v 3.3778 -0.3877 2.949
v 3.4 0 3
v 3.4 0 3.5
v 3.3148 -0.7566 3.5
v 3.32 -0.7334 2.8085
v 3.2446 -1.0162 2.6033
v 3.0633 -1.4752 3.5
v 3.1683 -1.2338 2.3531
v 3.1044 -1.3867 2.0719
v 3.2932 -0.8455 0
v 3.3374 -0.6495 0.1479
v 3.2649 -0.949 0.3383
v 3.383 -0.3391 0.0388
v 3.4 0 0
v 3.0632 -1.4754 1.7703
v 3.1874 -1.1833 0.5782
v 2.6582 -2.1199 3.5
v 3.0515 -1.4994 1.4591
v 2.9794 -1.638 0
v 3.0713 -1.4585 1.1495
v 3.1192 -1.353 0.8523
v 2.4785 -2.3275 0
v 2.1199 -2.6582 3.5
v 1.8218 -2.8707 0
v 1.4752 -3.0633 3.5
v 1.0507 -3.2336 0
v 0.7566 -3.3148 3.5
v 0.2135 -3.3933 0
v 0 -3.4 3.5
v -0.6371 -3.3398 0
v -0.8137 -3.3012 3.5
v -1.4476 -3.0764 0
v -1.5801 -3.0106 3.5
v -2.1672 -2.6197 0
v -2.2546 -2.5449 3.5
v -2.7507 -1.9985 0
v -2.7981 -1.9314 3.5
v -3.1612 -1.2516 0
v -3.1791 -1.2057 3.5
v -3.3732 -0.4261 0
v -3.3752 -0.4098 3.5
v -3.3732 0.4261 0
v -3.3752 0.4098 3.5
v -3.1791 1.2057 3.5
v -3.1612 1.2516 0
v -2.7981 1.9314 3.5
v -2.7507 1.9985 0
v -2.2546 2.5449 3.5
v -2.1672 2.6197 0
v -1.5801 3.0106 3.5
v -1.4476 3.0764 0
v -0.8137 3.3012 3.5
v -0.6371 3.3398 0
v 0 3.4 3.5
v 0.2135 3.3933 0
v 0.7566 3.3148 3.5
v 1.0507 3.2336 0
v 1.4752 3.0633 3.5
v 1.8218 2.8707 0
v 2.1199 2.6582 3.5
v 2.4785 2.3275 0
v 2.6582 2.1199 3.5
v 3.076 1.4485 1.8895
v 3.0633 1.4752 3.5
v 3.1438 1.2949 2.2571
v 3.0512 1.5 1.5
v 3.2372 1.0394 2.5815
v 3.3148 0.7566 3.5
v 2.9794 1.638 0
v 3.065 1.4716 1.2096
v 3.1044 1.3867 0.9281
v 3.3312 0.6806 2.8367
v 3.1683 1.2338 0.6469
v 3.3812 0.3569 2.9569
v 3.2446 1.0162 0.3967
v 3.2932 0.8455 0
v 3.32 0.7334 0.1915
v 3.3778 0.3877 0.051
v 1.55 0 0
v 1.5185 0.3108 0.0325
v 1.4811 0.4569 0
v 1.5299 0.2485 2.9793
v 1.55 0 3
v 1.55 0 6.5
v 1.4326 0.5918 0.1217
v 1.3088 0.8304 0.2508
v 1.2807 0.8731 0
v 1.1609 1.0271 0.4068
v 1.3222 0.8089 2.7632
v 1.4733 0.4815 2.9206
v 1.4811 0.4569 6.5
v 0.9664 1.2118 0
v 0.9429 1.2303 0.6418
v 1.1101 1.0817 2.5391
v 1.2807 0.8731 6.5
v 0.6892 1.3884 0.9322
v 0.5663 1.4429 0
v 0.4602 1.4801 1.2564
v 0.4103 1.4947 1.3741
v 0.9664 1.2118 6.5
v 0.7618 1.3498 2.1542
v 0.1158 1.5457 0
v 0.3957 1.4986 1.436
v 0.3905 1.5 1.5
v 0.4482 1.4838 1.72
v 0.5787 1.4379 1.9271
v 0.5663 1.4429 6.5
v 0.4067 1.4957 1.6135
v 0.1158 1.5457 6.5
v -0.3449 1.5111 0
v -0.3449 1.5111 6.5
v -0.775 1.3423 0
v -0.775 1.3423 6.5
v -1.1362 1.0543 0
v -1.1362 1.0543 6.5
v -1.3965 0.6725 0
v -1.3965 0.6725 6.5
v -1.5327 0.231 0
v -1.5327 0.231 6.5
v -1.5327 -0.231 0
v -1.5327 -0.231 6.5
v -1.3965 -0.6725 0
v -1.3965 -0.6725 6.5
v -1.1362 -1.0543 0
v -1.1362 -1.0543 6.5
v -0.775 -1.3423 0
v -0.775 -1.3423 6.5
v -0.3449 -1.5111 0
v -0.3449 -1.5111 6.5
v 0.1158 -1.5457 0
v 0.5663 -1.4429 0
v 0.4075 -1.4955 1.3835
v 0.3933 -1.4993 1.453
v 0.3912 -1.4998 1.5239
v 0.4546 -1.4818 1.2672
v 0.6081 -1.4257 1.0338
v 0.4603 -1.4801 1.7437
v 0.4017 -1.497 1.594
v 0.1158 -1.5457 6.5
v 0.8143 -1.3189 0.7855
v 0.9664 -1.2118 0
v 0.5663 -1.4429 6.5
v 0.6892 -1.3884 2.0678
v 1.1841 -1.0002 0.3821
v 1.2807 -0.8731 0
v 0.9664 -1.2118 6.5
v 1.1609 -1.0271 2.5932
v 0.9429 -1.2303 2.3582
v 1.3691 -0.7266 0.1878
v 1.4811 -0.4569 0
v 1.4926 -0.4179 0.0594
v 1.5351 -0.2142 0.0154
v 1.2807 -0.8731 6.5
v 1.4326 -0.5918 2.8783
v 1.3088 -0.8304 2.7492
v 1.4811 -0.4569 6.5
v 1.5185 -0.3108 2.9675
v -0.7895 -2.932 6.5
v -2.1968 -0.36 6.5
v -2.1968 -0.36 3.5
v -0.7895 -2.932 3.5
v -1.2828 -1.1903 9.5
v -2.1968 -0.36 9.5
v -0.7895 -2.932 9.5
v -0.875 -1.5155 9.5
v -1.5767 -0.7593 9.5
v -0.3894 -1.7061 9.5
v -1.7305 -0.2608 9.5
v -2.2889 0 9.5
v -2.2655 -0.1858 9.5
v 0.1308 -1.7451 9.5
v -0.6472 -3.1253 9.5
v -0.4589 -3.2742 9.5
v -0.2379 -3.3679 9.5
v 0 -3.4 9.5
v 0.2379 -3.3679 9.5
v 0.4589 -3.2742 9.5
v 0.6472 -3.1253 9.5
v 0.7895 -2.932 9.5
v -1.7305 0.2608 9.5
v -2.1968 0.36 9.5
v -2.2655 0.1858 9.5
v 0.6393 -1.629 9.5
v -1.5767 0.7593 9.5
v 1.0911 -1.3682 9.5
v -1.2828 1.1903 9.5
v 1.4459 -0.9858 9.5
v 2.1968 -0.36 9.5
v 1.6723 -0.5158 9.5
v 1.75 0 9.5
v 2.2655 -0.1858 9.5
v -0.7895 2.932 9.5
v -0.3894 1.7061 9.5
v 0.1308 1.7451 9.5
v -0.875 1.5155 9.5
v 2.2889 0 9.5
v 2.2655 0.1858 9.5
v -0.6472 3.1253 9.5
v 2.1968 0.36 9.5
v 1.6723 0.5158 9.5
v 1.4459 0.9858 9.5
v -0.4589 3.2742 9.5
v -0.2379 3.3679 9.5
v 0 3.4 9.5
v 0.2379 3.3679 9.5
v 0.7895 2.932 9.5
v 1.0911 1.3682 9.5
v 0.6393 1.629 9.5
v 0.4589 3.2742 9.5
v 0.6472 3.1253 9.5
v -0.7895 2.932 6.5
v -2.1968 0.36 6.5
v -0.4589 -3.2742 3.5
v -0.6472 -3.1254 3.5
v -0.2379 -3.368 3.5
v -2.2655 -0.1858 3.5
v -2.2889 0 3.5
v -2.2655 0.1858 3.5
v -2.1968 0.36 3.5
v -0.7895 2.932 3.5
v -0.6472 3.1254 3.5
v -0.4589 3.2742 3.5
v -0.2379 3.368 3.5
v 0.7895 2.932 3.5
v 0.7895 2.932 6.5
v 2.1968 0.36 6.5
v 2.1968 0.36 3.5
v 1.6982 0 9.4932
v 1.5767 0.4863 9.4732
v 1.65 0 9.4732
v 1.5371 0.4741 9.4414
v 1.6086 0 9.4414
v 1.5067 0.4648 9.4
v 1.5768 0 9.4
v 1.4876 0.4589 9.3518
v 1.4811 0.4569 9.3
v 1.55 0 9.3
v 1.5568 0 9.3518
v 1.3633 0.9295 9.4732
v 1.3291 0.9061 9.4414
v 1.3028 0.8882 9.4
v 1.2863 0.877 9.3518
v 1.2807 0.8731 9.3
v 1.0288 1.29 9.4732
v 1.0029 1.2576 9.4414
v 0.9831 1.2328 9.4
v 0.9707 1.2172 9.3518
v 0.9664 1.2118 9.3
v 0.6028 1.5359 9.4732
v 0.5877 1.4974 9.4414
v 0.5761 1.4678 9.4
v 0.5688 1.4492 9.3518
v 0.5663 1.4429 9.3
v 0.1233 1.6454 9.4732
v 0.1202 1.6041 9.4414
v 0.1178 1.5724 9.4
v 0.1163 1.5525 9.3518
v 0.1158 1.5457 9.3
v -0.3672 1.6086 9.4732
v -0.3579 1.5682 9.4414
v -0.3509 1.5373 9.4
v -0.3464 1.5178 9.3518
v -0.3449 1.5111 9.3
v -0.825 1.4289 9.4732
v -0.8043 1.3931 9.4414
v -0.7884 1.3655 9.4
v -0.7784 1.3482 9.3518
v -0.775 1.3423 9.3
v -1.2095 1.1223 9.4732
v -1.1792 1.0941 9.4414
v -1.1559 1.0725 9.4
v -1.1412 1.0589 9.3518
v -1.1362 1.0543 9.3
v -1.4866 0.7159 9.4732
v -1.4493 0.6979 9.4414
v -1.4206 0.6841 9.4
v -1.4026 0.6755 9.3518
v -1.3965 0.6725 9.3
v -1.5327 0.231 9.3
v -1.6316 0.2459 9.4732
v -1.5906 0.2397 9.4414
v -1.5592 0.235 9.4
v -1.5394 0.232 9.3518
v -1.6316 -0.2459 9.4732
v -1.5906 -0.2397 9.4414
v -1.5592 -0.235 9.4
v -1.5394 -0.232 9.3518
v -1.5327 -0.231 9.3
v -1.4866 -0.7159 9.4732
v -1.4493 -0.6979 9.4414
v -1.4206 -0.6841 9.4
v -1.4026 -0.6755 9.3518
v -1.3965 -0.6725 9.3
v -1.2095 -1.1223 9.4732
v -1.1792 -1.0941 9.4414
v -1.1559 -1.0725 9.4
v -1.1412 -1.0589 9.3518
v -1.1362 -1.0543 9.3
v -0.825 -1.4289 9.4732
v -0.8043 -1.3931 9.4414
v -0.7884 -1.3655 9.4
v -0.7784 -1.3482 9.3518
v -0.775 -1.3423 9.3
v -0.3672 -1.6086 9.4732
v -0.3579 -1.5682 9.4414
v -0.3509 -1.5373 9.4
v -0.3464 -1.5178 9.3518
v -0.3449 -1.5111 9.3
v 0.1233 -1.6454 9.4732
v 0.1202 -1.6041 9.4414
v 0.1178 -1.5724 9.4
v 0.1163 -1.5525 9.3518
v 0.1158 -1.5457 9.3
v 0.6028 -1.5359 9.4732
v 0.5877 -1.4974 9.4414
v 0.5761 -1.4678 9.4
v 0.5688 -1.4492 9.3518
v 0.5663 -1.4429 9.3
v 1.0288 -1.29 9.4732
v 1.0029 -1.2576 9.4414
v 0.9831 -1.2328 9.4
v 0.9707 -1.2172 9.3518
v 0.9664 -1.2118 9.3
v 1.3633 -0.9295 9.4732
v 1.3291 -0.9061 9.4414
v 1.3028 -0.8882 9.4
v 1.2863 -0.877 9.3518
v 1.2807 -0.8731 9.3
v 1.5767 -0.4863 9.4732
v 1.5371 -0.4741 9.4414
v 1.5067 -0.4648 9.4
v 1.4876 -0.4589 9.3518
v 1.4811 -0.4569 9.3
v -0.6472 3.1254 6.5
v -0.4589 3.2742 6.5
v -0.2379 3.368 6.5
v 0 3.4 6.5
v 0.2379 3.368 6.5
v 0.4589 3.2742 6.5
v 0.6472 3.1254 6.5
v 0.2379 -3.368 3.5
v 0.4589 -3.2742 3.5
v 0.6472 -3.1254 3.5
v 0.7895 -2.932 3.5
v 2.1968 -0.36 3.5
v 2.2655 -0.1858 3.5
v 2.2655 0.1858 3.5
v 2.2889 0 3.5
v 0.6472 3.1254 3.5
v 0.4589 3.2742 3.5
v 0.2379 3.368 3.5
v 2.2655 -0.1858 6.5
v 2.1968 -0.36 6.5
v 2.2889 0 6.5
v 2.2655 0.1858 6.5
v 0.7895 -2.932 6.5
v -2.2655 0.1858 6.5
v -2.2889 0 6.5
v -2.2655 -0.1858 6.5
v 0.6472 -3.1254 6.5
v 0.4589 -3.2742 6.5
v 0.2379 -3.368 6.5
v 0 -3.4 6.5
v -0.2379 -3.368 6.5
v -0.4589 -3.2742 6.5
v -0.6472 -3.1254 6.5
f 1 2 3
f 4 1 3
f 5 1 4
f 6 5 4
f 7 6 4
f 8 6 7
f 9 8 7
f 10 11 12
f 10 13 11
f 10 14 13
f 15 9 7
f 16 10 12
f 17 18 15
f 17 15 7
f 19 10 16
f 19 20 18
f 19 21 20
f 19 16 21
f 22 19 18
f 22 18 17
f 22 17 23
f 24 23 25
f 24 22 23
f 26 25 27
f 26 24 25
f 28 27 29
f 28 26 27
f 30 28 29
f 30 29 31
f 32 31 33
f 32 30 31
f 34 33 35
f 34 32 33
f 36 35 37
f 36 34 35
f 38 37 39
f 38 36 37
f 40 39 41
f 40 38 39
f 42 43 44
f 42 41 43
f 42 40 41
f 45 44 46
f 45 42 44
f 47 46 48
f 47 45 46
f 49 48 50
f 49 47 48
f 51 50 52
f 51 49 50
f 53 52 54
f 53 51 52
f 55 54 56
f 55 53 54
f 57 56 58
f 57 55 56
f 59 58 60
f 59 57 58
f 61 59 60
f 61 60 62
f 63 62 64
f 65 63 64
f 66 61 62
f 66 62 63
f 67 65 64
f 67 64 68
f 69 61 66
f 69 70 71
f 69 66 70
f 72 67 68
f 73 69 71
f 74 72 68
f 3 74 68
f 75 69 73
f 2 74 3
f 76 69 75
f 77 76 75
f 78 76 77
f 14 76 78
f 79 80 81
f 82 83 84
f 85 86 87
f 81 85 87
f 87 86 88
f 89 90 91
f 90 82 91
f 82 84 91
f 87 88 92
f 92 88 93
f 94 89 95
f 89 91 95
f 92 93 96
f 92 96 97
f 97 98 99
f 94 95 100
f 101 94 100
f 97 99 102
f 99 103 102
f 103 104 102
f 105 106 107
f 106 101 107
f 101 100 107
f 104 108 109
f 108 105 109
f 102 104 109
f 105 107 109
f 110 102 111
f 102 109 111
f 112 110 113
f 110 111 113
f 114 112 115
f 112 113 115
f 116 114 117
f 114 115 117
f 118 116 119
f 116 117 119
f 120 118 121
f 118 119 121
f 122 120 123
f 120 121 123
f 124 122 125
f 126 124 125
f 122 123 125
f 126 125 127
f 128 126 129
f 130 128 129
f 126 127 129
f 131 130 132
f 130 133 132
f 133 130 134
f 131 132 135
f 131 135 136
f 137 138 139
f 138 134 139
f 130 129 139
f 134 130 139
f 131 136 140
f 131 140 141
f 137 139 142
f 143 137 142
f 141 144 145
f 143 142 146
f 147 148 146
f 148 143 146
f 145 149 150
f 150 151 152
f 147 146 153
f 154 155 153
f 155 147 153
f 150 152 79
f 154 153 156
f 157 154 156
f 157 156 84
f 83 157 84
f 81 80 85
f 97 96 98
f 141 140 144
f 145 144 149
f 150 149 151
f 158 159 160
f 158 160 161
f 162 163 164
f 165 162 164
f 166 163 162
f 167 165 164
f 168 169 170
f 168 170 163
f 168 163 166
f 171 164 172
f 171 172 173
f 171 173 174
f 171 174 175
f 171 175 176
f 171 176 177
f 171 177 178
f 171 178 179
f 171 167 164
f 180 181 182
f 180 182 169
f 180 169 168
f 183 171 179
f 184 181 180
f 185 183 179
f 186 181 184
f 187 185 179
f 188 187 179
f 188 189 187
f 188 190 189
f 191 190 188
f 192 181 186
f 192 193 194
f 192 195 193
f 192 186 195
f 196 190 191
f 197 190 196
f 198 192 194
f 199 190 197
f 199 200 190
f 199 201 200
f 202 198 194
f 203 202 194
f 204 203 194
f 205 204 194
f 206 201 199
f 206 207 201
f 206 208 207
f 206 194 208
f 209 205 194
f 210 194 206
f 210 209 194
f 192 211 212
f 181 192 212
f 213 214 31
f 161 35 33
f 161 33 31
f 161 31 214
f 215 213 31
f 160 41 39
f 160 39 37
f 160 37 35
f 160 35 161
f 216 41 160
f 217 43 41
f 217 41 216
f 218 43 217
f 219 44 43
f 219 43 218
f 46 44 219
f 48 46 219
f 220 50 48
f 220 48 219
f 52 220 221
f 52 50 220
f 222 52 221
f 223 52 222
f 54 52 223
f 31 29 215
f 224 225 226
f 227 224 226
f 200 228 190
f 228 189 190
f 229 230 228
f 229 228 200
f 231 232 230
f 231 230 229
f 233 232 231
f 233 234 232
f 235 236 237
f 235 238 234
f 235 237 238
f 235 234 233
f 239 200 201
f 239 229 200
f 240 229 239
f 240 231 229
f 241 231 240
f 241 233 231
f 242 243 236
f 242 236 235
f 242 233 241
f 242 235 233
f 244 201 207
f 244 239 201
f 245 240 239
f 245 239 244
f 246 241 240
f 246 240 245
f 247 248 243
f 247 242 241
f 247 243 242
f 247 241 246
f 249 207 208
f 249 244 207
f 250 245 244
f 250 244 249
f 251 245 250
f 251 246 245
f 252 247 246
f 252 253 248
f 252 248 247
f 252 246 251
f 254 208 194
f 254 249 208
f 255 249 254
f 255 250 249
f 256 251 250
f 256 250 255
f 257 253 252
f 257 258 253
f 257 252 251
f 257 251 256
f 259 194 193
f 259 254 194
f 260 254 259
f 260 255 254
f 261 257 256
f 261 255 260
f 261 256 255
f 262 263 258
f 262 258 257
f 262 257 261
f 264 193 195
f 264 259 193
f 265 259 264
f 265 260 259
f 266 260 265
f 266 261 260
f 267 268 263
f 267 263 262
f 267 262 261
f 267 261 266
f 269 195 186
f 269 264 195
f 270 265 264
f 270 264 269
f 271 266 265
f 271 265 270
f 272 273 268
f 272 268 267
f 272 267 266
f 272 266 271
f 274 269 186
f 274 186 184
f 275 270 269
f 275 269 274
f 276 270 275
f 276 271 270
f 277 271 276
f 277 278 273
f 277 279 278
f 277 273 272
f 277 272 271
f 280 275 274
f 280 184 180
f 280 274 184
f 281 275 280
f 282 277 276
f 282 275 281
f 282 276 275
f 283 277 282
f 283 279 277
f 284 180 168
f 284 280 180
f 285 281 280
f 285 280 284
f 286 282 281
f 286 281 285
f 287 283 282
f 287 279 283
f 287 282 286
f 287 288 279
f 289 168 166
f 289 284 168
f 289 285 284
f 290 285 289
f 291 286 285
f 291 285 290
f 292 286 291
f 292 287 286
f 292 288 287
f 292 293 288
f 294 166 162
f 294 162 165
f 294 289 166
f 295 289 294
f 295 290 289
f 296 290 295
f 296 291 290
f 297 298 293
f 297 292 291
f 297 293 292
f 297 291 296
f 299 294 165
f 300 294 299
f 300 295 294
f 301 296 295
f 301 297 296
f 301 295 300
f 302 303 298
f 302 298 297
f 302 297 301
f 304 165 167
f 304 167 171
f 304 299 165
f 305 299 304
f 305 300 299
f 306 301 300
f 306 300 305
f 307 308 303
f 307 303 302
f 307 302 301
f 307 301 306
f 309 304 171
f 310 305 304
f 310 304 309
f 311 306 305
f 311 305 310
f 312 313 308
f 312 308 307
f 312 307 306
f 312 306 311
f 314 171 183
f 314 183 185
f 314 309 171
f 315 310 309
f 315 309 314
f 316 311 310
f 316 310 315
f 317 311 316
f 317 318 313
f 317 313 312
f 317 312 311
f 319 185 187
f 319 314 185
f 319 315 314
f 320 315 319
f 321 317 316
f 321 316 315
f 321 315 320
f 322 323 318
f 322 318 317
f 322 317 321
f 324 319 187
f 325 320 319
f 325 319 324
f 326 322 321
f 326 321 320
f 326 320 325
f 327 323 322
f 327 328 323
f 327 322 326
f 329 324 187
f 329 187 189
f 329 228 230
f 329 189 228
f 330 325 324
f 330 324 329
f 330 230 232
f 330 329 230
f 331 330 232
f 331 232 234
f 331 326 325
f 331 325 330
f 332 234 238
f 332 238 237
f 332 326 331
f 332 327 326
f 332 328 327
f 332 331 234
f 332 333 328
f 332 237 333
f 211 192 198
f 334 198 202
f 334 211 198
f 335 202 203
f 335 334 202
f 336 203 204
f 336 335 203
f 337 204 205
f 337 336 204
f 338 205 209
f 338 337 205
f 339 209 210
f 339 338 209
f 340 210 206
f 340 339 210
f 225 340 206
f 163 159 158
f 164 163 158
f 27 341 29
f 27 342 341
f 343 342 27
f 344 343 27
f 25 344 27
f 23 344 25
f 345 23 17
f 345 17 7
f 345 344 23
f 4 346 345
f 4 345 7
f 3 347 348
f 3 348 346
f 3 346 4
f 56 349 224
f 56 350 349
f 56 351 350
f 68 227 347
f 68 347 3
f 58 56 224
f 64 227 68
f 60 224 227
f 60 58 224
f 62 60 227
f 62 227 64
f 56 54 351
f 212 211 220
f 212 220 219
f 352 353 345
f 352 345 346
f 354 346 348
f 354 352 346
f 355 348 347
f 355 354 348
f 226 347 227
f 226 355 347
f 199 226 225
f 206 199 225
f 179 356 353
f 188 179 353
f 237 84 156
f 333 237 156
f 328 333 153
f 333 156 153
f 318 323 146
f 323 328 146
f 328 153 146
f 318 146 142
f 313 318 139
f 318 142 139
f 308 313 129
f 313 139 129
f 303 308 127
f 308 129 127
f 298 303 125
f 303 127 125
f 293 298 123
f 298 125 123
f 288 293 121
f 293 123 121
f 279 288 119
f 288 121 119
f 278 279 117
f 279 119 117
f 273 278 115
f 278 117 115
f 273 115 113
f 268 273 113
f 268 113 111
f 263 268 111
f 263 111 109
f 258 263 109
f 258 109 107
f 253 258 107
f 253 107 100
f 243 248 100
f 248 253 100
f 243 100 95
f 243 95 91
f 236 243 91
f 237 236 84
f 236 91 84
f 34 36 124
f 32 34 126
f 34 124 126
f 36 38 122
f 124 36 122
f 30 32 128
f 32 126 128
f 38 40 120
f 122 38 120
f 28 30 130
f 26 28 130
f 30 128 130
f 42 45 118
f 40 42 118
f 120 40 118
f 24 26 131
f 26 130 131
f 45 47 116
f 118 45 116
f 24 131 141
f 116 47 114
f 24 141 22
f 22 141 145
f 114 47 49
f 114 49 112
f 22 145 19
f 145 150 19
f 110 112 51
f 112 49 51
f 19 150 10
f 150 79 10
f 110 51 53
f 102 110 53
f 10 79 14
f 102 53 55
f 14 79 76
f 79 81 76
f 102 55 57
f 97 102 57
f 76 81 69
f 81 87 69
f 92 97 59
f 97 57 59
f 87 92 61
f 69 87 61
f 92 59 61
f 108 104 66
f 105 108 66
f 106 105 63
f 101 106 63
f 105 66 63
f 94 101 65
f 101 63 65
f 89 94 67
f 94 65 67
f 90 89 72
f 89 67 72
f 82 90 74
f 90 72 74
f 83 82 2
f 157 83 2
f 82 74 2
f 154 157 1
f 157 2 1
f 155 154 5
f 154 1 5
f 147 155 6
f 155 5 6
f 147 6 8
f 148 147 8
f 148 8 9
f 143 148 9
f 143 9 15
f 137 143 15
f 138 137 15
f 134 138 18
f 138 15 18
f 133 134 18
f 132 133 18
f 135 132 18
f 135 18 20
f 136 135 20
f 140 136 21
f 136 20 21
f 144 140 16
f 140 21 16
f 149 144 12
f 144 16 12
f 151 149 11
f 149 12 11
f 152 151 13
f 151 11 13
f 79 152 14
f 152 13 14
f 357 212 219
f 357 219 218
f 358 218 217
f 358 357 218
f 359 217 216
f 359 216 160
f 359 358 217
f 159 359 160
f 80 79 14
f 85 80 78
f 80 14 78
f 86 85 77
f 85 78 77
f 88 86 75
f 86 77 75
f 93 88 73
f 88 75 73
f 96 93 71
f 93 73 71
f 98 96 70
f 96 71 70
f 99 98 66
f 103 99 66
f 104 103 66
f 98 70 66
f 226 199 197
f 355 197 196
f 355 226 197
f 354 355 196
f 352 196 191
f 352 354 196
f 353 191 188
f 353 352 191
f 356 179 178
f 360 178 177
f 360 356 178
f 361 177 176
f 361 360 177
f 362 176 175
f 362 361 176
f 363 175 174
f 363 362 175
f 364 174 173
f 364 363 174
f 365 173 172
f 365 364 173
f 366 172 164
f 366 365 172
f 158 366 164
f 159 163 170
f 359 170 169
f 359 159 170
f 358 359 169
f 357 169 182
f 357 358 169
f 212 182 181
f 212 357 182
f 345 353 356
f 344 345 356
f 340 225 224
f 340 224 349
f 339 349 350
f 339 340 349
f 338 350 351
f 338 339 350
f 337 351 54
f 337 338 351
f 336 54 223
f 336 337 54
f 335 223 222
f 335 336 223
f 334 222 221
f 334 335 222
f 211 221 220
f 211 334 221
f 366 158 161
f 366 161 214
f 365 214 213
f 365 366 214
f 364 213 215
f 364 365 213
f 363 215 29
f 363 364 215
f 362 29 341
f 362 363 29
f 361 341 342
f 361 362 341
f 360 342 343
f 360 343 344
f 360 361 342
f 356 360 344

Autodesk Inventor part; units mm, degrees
ref_plane "XZ Plane" through (0, 0, 0) normal (0, 1, 0) x (-1, 0, 0)
ref_plane "XY Plane" through (0, 0, 0) normal (0, 0, 1) x (1, 0, 0)
sketch "草圖1" plane through (0, 0, 0) normal (0, 0, 1) x (1, 0, 0)
  circle A0 centre (0, 0) radius 3.4
  dimension "d0" = 6.8
extrude "擠出1" add sketch "草圖1" along normal blind 6.5
sketch "草圖2" plane through (0, 0, 6.5) normal (0, 0, 1) x (1, 0, 0)
  circle A0 centre (0, 0) radius 1.55
  dimension "d3" = 3.1
extrude "擠出2" cut sketch "草圖2" against normal up to surface (6.5 mm away)
ref_plane "工作平面1" through (3.4, 0, 0) normal (1, 0, 0) x (0, 1, 0)
sketch "草圖3" plane through (3.4, 0, 0) normal (1, 0, 0) x (0, 1, 0)
  circle A0 centre (0, 1.5) radius 1.5
  line L0 (0, -1.3) -> (0, 7.8) projected
  line L1 (3.4, 0) -> (-3.4, 0) projected
  point P0 (0, 0)
  dimension "d6" = 3
extrude "擠出3" cut sketch "草圖3" against normal up to surface
sketch "草圖4" plane through (0, 0, 6.5) normal (0, 0, 1) x (1, 0, 0)
  circle A0 centre (0, 2.5) radius 0.9
  circle A1 centre (0, -2.5) radius 0.9
  line L0 (-0.7895, 2.932) -> (-2.3938, 0)
  line L1 (-2.3938, 0) -> (-0.7895, -2.932)
  line L2 (0.7895, 2.932) -> (2.3938, 0)
  line L3 (2.3938, 0) -> (0.7895, -2.932)
  circle A2 centre (-1.5389, 0) radius 0.75
  line L4 (3.4, 0) -> (1.55, 0) projected
  circle A3 centre (1.5389, 0) radius 0.75
  line L5 (0, -4.76) -> (0, 4.76) projected
  circle A4 centre (0, 0) radius 3.4 projected
  circle A5 centre (0, 0) radius 2.1
  point P0 (0, 3.4)
  point P1 (2.1968, 0.36)
  point P2 (2.1968, -0.36)
  point P3 (0, -3.4)
  point P4 (-2.1968, -0.36)
  point P5 (-2.1968, 0.36)
  dimension "d10" = 1.8
  dimension "d13" = 1.5
  dimension "d16" = 4.2
extrude "擠出4" cut sketch "草圖4" against normal blind 3 contours A0 A4 L4 L2 | A0 L0 L1 A1 A4 | A4 A1 L3 L4 | L2 L4 A3 | L3 A3 L4 | A2 L1 L0
sketch "草圖5" plane through (0, 0, 6.5) normal (0, 0, 1) x (1, 0, 0)
  arc A0 (-0.7895, -2.932) -> (0.7895, -2.932) centre (0, -2.5) ccw projected
  line L0 (0.7895, -2.932) -> (2.1968, -0.36) projected
  arc A1 (2.1968, -0.36) -> (2.1968, 0.36) centre (1.5389, 0) ccw projected
  line L1 (2.1968, 0.36) -> (0.7895, 2.932) projected
  arc A2 (0.7895, 2.932) -> (-0.7895, 2.932) centre (0, 2.5) ccw projected
  line L2 (-0.7895, 2.932) -> (-2.1968, 0.36) projected
  arc A3 (-2.1968, 0.36) -> (-2.1968, -0.36) centre (-1.5389, 0) ccw projected
  line L3 (-2.1968, -0.36) -> (-0.7895, -2.932) projected
  circle A4 centre (0, 0) radius 1.55 projected
extrude "擠出5" add sketch "草圖5" along normal blind 3
fillet "圓角1" radius 0.2 1 edges at (-1.55, 0, 9.5)
properties part number "Coupling_0519"
